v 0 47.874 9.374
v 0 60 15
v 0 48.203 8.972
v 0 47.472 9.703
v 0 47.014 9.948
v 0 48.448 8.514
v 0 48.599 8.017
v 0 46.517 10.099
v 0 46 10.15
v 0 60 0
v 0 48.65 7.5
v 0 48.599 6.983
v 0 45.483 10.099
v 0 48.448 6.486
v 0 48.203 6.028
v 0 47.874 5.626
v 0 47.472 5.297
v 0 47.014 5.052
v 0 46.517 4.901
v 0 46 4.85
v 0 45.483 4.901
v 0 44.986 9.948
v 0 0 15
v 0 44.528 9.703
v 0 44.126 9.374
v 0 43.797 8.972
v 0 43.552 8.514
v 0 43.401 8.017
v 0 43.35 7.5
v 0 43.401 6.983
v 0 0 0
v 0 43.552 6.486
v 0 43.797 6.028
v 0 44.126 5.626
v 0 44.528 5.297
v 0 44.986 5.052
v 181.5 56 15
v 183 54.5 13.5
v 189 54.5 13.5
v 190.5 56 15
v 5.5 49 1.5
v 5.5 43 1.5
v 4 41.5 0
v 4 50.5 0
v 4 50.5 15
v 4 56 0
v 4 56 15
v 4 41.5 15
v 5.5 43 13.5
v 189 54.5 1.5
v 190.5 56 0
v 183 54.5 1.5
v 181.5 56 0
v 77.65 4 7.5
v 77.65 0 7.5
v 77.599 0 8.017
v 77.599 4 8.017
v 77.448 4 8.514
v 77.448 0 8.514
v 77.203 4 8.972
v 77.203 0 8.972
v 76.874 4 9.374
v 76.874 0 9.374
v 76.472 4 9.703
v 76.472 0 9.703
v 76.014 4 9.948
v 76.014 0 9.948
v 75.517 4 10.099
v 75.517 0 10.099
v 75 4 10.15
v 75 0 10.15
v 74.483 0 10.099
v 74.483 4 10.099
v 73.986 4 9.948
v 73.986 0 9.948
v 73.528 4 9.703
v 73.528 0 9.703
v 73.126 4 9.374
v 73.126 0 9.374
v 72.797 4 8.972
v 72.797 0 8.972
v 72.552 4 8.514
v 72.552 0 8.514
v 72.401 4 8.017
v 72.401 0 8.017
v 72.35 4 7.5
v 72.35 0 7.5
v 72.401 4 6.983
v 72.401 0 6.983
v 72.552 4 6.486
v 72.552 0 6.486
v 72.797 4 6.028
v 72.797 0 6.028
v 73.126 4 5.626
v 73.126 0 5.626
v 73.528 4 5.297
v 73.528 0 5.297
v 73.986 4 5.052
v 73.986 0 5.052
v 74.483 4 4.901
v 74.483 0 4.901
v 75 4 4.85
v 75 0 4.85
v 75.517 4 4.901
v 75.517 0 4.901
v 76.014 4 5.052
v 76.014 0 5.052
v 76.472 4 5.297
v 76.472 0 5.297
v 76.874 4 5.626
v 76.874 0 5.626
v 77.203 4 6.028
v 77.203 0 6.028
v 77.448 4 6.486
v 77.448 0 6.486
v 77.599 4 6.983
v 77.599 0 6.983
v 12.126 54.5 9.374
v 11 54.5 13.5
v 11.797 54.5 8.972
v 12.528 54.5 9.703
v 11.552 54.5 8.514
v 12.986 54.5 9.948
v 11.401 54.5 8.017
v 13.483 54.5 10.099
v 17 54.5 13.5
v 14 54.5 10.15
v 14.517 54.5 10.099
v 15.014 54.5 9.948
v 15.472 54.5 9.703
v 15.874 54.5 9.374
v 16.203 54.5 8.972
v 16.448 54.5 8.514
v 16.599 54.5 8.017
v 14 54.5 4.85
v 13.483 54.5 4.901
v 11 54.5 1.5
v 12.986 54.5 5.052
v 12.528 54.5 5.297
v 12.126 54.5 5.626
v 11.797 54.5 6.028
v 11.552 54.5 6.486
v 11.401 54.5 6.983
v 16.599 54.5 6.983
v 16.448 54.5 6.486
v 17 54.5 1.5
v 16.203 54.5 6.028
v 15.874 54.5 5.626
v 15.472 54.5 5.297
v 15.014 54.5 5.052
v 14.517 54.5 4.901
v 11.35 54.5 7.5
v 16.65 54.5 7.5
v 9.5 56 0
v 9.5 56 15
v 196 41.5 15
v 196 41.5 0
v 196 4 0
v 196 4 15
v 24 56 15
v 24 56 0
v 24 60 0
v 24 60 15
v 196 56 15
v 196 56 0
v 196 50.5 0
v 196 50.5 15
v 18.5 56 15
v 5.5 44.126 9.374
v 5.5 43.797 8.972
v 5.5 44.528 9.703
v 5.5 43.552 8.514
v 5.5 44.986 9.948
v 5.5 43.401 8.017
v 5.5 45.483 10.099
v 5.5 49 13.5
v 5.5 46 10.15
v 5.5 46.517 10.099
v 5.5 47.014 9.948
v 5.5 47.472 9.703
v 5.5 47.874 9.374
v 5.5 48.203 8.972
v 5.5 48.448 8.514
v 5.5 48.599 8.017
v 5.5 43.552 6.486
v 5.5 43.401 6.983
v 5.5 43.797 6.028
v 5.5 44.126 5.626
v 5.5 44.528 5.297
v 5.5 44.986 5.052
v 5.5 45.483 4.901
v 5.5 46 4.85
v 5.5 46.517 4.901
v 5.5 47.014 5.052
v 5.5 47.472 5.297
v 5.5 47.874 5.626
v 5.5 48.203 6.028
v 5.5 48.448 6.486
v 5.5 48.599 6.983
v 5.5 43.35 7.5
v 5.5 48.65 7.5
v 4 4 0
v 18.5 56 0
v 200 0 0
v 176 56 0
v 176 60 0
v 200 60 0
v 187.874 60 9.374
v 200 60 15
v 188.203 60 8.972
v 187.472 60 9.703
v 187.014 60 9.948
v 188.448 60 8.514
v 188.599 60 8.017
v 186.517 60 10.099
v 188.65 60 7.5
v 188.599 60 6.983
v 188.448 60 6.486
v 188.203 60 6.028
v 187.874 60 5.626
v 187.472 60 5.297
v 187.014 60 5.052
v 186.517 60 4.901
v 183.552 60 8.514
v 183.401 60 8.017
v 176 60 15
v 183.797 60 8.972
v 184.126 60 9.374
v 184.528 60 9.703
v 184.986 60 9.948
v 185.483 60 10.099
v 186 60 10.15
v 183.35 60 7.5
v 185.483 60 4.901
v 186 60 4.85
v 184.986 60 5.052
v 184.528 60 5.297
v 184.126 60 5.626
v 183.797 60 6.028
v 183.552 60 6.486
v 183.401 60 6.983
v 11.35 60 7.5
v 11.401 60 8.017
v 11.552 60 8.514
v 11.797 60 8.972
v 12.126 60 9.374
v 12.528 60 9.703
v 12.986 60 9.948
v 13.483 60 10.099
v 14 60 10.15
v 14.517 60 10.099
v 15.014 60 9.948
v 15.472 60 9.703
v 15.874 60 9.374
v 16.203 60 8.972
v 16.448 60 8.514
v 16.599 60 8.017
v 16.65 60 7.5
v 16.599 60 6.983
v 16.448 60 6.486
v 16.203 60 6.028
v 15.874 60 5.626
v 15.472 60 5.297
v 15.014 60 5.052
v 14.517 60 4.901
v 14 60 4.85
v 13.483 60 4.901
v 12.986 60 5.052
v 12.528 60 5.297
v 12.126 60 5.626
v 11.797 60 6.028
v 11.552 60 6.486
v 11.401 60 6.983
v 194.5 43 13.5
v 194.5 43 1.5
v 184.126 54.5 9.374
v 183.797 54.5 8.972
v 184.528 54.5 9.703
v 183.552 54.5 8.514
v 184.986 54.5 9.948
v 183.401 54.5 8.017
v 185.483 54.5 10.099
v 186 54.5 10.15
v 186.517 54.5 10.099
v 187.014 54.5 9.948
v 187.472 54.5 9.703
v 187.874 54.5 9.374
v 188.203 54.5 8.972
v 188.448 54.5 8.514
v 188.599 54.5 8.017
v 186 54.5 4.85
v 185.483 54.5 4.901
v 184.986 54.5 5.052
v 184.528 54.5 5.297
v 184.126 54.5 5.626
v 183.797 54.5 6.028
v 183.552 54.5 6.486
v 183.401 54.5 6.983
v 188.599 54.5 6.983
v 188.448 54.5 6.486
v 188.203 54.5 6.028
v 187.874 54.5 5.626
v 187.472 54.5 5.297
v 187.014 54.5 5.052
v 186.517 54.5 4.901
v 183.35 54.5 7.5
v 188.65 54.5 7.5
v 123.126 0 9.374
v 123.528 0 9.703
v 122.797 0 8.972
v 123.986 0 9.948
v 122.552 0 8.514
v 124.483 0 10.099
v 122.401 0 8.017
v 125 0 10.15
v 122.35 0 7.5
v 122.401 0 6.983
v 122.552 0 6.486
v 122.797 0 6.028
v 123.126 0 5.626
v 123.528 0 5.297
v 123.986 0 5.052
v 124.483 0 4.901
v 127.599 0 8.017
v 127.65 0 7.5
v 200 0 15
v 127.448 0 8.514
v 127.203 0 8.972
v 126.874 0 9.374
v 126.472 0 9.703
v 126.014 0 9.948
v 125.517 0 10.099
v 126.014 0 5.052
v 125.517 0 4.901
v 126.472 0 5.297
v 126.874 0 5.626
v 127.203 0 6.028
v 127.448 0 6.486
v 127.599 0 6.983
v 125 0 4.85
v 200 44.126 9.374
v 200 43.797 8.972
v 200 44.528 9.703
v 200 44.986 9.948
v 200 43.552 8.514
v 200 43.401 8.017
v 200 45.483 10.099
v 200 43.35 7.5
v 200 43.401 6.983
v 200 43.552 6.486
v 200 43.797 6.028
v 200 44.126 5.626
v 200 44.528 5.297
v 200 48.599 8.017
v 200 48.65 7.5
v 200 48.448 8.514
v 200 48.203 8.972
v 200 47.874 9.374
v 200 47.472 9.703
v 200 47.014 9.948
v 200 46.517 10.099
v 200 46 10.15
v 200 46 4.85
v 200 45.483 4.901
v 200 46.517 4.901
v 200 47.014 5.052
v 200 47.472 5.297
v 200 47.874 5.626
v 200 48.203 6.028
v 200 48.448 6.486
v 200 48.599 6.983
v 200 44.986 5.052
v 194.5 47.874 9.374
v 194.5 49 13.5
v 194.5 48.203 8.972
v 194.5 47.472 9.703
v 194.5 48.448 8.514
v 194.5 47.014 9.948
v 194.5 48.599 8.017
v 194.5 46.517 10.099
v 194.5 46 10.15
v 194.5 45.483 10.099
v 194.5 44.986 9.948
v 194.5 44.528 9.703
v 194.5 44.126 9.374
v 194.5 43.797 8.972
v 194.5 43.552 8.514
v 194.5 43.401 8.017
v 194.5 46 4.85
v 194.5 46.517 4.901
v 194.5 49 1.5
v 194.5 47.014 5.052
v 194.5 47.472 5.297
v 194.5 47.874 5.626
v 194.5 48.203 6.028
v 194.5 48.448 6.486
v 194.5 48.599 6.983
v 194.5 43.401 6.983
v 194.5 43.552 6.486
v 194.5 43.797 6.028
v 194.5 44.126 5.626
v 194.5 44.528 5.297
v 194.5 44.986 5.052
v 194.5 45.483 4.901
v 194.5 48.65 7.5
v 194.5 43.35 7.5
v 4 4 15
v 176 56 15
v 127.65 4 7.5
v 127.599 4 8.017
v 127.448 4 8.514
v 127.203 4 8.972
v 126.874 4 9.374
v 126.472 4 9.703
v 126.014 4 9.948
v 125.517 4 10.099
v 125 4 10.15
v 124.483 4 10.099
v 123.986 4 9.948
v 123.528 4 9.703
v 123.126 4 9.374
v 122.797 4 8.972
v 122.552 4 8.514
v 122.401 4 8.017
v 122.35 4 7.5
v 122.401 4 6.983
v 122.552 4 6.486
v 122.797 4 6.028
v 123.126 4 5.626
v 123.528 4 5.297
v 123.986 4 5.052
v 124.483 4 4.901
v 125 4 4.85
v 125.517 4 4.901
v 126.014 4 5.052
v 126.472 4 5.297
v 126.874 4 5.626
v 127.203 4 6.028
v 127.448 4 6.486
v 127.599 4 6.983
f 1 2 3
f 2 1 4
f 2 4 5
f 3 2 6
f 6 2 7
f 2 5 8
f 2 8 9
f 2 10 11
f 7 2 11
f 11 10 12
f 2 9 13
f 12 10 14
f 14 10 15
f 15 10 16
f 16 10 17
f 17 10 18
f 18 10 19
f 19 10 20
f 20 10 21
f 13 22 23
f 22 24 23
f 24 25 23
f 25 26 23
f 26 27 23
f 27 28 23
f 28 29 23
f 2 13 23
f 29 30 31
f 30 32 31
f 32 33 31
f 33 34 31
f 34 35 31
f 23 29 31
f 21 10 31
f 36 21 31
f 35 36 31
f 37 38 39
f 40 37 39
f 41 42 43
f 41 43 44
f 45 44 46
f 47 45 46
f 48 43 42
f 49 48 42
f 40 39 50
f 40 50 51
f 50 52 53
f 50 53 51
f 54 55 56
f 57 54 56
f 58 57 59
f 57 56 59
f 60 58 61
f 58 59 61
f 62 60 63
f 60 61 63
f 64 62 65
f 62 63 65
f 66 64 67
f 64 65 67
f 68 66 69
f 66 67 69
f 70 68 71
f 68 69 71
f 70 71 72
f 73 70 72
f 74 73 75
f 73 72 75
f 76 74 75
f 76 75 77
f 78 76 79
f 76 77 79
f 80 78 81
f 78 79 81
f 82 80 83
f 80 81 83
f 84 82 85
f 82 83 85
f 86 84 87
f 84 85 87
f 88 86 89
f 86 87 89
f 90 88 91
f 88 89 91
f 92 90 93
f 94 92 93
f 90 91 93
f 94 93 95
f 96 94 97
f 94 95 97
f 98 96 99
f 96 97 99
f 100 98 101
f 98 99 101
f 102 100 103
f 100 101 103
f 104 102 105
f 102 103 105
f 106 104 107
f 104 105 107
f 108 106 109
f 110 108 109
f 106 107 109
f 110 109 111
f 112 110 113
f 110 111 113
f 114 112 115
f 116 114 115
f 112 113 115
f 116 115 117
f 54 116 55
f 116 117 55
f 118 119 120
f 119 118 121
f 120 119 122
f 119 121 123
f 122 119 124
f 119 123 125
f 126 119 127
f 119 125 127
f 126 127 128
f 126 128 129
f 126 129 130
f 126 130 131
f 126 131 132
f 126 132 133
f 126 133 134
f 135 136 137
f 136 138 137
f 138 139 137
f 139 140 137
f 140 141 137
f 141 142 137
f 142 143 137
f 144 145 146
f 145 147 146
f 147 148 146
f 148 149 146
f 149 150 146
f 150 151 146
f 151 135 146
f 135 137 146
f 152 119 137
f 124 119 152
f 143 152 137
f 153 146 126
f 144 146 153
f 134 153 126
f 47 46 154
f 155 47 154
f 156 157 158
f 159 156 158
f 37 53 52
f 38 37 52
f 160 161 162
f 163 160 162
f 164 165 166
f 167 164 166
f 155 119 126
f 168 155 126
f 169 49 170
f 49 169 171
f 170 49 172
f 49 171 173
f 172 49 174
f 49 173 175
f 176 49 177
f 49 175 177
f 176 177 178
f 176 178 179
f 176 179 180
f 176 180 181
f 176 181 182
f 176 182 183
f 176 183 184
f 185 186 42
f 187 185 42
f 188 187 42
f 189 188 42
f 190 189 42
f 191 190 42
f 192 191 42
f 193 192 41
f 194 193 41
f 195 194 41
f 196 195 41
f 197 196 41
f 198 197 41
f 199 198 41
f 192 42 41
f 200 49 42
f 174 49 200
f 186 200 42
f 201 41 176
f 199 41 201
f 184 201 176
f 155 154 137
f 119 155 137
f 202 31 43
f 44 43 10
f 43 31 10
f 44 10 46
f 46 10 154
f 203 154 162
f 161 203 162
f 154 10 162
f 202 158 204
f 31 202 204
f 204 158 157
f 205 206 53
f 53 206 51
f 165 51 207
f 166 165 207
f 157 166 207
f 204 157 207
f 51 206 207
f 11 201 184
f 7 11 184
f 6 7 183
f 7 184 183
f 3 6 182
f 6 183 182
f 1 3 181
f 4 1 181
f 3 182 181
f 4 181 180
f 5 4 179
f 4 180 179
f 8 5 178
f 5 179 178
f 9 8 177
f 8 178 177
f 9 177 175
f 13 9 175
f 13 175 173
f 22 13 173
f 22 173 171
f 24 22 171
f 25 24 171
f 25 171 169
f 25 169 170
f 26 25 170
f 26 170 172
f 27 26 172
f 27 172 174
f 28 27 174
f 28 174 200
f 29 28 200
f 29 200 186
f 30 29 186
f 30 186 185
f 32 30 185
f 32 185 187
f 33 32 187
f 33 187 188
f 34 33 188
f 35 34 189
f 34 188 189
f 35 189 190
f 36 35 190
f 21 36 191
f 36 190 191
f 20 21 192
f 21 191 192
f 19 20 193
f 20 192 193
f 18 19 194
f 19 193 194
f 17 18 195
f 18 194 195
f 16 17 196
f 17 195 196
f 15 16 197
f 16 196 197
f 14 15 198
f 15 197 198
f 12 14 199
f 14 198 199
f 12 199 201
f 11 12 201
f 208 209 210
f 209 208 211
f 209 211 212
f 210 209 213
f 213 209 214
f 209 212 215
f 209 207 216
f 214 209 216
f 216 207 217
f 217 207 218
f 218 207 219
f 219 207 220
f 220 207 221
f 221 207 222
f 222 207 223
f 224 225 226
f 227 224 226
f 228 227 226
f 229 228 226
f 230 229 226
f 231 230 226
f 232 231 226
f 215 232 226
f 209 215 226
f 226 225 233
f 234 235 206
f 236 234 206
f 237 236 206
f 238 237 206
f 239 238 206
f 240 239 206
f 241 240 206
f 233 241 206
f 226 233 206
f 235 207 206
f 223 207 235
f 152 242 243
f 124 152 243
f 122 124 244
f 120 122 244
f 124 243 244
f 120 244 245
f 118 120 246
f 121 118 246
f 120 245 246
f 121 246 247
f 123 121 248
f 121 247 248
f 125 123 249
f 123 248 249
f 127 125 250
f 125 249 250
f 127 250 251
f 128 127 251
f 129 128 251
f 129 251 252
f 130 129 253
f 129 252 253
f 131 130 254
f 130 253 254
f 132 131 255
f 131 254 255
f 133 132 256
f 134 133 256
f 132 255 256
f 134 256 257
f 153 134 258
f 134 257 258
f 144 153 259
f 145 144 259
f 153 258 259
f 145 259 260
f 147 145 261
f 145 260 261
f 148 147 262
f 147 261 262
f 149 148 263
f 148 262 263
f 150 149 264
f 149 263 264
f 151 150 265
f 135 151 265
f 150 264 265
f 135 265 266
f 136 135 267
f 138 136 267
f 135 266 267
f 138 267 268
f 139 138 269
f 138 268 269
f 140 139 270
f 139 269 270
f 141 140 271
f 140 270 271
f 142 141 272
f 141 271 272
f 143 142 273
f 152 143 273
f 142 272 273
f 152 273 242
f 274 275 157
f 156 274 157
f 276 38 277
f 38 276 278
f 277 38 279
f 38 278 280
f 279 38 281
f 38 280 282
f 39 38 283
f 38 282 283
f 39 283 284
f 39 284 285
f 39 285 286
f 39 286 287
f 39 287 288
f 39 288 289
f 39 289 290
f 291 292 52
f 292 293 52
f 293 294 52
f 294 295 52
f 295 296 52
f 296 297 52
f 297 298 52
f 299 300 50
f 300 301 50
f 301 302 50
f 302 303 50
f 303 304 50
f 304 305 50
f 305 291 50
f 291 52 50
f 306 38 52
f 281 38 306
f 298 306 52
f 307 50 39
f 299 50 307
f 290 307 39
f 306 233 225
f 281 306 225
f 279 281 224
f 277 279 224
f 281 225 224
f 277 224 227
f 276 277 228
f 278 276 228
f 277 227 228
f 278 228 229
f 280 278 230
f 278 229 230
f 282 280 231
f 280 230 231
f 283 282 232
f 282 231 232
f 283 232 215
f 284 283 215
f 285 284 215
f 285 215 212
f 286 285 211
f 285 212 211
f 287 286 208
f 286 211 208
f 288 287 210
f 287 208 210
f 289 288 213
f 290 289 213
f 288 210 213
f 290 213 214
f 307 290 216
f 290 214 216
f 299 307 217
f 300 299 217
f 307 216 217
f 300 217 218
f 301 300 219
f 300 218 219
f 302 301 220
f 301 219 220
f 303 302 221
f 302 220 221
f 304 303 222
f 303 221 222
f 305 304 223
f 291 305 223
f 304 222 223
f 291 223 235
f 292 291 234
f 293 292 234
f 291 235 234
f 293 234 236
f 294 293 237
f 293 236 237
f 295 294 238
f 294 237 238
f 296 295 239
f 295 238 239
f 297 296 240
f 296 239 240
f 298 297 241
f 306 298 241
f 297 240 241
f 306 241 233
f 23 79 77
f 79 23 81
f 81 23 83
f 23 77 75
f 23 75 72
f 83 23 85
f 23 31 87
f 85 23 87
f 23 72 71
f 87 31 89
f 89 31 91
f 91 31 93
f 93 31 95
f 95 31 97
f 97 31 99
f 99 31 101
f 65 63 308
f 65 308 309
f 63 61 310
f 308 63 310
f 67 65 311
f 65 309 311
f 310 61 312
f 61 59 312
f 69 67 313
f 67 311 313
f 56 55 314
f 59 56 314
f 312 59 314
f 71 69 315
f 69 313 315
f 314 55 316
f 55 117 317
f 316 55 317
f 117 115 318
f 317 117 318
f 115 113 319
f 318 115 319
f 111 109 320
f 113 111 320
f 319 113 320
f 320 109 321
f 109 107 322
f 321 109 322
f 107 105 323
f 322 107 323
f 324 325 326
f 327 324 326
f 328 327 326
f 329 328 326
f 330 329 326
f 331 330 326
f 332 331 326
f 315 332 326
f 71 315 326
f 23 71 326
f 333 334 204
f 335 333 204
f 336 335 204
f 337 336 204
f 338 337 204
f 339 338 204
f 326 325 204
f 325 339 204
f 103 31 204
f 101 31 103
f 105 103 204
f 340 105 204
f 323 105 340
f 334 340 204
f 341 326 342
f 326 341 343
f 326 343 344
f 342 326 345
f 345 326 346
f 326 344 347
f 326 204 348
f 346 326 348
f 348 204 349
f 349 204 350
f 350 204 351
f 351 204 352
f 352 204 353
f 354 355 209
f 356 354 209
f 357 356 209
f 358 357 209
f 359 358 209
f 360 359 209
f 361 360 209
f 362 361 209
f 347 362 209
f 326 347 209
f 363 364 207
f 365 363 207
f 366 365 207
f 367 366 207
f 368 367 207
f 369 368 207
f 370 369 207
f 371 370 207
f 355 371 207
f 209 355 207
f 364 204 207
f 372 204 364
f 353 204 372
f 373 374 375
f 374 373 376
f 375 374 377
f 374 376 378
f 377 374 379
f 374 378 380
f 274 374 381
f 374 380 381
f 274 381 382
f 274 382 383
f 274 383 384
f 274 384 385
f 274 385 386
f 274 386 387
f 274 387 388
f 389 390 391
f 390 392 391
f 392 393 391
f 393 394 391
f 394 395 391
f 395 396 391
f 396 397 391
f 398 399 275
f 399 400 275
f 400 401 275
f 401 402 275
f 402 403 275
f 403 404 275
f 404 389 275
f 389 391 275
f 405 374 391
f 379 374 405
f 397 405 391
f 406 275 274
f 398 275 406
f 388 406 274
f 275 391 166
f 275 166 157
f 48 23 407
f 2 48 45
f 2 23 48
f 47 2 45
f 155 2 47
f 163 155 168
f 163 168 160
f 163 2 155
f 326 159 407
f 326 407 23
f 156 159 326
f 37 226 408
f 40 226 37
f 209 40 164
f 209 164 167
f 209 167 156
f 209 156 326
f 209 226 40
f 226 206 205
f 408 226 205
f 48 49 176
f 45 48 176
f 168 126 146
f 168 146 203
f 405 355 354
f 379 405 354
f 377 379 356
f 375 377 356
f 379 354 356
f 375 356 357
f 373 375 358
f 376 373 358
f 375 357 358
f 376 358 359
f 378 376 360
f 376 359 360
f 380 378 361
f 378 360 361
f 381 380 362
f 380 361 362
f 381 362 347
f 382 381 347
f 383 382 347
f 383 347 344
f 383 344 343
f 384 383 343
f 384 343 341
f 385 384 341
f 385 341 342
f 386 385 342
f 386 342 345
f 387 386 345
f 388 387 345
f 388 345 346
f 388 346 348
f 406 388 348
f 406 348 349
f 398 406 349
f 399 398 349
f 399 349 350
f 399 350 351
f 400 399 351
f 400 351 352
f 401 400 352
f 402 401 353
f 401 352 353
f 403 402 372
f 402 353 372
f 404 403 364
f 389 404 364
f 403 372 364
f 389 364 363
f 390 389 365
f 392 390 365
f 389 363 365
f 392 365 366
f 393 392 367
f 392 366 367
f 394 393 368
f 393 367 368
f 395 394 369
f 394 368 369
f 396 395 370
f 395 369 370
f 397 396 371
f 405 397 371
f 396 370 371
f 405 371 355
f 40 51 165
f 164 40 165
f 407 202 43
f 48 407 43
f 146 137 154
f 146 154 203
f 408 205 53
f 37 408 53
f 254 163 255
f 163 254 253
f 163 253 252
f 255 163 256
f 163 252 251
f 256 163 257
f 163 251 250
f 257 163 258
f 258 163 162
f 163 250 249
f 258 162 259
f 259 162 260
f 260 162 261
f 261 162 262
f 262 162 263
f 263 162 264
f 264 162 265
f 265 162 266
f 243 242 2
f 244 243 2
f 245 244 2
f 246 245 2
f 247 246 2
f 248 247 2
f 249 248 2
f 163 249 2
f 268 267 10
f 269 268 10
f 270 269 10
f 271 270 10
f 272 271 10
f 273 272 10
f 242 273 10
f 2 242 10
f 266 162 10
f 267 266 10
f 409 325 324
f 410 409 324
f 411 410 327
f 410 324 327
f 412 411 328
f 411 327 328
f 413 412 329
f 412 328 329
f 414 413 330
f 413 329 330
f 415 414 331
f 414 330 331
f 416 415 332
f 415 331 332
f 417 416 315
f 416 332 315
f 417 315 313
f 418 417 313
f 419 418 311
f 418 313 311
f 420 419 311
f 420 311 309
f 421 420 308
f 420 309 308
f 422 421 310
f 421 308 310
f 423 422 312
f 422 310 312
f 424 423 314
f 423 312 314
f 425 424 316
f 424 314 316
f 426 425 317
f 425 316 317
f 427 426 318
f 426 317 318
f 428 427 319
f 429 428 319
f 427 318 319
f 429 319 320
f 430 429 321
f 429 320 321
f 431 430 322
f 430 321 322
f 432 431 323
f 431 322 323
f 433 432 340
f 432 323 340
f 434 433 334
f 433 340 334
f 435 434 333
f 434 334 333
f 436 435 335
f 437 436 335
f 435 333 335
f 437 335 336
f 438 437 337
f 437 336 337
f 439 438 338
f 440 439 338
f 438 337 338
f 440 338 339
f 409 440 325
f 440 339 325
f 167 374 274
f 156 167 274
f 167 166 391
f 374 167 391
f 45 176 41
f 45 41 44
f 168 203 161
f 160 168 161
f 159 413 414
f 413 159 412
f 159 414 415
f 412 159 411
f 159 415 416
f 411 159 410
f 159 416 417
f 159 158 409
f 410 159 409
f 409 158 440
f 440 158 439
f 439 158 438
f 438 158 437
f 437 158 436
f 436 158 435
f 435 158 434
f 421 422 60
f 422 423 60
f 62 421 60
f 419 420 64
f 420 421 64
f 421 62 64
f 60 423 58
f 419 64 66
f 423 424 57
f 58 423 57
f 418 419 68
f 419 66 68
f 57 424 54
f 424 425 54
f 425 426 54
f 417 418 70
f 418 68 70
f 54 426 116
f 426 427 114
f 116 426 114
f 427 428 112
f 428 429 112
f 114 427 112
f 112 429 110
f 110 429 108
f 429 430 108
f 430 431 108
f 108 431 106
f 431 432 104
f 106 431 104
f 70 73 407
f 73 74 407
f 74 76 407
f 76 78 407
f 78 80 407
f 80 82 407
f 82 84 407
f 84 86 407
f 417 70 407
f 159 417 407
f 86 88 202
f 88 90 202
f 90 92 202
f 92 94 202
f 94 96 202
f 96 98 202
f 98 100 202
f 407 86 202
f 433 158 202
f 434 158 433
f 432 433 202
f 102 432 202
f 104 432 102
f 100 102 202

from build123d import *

# Parameters (mm, degrees)
F1_DEPTH  = 15
F3_DEPTH  = 15
F4_SIZE   = 1.5
F5_R      = 2.65
F6_DEPTH  = 4
F7_R      = 2.65
F8_DEPTH  = 200.001
F9_R      = 2.65
F10_DEPTH = 5.5


with BuildPart() as f1:
    # F0 (on Top) → F1 (new body)
    with BuildSketch(Plane.XY):
        Polygon((0, 60), (0, 0), (200, 0), (200, 60), (176, 60), (176, 56), (196, 56), (196, 4), (4, 4), (4, 56), (24, 56), (24, 60), align=None)
    extrude(amount=F1_DEPTH)

    # F2 (on Top) → F3 (join, through all)
    with BuildSketch(Plane.XY):
        Polygon((17, 54.5), (18.5, 56), (9.5, 56), (11, 54.5), align=None)
        Polygon((5.5, 49), (4, 50.5), (4, 41.5), (5.5, 43), align=None)
        Polygon((196, 41.5), (196, 50.5), (194.5, 49), (194.5, 43), align=None)
        Polygon((189, 54.5), (190.5, 56), (181.5, 56), (183, 54.5), align=None)
    extrude(amount=F3_DEPTH)

    # F4
    f4_edges = [f1.edges().sort_by_distance(p)[0] for p in [
        (5.5, 46, 15),
        (5.5, 46, 0),
        (14, 54.5, 0),
        (14, 54.5, 15),
        (186, 54.5, 15),
        (194.5, 46, 15),
        (194.5, 46, 0),
        (186, 54.5, 0),
    ]]
    chamfer(f4_edges, length=F4_SIZE)

    # F5 (on face) → F6 (cut, through all)
    with BuildSketch(Plane.XZ):
        with Locations((75, 7.5)):
            Circle(F5_R)
        with Locations((125, 7.5)):
            Circle(F5_R)
    extrude(amount=-F6_DEPTH, mode=Mode.SUBTRACT)

    # F7 (on face) → F8 (cut, through all)
    with BuildSketch(Plane.YZ.offset(200)):
        with Locations((46, 7.5)):
            Circle(F7_R)
    extrude(amount=-F8_DEPTH, mode=Mode.SUBTRACT)

    # F9 (on face) → F10 (cut, through all)
    with BuildSketch(Plane(origin=(0, 60, 0), x_dir=(-1, 0, 0), z_dir=(0, 1, 0))):
        with Locations((-186, 7.5)):
            Circle(F9_R)
        with Locations((-14, 7.5)):
            Circle(F9_R)
    extrude(amount=-F10_DEPTH, mode=Mode.SUBTRACT)


solid = f1.part
